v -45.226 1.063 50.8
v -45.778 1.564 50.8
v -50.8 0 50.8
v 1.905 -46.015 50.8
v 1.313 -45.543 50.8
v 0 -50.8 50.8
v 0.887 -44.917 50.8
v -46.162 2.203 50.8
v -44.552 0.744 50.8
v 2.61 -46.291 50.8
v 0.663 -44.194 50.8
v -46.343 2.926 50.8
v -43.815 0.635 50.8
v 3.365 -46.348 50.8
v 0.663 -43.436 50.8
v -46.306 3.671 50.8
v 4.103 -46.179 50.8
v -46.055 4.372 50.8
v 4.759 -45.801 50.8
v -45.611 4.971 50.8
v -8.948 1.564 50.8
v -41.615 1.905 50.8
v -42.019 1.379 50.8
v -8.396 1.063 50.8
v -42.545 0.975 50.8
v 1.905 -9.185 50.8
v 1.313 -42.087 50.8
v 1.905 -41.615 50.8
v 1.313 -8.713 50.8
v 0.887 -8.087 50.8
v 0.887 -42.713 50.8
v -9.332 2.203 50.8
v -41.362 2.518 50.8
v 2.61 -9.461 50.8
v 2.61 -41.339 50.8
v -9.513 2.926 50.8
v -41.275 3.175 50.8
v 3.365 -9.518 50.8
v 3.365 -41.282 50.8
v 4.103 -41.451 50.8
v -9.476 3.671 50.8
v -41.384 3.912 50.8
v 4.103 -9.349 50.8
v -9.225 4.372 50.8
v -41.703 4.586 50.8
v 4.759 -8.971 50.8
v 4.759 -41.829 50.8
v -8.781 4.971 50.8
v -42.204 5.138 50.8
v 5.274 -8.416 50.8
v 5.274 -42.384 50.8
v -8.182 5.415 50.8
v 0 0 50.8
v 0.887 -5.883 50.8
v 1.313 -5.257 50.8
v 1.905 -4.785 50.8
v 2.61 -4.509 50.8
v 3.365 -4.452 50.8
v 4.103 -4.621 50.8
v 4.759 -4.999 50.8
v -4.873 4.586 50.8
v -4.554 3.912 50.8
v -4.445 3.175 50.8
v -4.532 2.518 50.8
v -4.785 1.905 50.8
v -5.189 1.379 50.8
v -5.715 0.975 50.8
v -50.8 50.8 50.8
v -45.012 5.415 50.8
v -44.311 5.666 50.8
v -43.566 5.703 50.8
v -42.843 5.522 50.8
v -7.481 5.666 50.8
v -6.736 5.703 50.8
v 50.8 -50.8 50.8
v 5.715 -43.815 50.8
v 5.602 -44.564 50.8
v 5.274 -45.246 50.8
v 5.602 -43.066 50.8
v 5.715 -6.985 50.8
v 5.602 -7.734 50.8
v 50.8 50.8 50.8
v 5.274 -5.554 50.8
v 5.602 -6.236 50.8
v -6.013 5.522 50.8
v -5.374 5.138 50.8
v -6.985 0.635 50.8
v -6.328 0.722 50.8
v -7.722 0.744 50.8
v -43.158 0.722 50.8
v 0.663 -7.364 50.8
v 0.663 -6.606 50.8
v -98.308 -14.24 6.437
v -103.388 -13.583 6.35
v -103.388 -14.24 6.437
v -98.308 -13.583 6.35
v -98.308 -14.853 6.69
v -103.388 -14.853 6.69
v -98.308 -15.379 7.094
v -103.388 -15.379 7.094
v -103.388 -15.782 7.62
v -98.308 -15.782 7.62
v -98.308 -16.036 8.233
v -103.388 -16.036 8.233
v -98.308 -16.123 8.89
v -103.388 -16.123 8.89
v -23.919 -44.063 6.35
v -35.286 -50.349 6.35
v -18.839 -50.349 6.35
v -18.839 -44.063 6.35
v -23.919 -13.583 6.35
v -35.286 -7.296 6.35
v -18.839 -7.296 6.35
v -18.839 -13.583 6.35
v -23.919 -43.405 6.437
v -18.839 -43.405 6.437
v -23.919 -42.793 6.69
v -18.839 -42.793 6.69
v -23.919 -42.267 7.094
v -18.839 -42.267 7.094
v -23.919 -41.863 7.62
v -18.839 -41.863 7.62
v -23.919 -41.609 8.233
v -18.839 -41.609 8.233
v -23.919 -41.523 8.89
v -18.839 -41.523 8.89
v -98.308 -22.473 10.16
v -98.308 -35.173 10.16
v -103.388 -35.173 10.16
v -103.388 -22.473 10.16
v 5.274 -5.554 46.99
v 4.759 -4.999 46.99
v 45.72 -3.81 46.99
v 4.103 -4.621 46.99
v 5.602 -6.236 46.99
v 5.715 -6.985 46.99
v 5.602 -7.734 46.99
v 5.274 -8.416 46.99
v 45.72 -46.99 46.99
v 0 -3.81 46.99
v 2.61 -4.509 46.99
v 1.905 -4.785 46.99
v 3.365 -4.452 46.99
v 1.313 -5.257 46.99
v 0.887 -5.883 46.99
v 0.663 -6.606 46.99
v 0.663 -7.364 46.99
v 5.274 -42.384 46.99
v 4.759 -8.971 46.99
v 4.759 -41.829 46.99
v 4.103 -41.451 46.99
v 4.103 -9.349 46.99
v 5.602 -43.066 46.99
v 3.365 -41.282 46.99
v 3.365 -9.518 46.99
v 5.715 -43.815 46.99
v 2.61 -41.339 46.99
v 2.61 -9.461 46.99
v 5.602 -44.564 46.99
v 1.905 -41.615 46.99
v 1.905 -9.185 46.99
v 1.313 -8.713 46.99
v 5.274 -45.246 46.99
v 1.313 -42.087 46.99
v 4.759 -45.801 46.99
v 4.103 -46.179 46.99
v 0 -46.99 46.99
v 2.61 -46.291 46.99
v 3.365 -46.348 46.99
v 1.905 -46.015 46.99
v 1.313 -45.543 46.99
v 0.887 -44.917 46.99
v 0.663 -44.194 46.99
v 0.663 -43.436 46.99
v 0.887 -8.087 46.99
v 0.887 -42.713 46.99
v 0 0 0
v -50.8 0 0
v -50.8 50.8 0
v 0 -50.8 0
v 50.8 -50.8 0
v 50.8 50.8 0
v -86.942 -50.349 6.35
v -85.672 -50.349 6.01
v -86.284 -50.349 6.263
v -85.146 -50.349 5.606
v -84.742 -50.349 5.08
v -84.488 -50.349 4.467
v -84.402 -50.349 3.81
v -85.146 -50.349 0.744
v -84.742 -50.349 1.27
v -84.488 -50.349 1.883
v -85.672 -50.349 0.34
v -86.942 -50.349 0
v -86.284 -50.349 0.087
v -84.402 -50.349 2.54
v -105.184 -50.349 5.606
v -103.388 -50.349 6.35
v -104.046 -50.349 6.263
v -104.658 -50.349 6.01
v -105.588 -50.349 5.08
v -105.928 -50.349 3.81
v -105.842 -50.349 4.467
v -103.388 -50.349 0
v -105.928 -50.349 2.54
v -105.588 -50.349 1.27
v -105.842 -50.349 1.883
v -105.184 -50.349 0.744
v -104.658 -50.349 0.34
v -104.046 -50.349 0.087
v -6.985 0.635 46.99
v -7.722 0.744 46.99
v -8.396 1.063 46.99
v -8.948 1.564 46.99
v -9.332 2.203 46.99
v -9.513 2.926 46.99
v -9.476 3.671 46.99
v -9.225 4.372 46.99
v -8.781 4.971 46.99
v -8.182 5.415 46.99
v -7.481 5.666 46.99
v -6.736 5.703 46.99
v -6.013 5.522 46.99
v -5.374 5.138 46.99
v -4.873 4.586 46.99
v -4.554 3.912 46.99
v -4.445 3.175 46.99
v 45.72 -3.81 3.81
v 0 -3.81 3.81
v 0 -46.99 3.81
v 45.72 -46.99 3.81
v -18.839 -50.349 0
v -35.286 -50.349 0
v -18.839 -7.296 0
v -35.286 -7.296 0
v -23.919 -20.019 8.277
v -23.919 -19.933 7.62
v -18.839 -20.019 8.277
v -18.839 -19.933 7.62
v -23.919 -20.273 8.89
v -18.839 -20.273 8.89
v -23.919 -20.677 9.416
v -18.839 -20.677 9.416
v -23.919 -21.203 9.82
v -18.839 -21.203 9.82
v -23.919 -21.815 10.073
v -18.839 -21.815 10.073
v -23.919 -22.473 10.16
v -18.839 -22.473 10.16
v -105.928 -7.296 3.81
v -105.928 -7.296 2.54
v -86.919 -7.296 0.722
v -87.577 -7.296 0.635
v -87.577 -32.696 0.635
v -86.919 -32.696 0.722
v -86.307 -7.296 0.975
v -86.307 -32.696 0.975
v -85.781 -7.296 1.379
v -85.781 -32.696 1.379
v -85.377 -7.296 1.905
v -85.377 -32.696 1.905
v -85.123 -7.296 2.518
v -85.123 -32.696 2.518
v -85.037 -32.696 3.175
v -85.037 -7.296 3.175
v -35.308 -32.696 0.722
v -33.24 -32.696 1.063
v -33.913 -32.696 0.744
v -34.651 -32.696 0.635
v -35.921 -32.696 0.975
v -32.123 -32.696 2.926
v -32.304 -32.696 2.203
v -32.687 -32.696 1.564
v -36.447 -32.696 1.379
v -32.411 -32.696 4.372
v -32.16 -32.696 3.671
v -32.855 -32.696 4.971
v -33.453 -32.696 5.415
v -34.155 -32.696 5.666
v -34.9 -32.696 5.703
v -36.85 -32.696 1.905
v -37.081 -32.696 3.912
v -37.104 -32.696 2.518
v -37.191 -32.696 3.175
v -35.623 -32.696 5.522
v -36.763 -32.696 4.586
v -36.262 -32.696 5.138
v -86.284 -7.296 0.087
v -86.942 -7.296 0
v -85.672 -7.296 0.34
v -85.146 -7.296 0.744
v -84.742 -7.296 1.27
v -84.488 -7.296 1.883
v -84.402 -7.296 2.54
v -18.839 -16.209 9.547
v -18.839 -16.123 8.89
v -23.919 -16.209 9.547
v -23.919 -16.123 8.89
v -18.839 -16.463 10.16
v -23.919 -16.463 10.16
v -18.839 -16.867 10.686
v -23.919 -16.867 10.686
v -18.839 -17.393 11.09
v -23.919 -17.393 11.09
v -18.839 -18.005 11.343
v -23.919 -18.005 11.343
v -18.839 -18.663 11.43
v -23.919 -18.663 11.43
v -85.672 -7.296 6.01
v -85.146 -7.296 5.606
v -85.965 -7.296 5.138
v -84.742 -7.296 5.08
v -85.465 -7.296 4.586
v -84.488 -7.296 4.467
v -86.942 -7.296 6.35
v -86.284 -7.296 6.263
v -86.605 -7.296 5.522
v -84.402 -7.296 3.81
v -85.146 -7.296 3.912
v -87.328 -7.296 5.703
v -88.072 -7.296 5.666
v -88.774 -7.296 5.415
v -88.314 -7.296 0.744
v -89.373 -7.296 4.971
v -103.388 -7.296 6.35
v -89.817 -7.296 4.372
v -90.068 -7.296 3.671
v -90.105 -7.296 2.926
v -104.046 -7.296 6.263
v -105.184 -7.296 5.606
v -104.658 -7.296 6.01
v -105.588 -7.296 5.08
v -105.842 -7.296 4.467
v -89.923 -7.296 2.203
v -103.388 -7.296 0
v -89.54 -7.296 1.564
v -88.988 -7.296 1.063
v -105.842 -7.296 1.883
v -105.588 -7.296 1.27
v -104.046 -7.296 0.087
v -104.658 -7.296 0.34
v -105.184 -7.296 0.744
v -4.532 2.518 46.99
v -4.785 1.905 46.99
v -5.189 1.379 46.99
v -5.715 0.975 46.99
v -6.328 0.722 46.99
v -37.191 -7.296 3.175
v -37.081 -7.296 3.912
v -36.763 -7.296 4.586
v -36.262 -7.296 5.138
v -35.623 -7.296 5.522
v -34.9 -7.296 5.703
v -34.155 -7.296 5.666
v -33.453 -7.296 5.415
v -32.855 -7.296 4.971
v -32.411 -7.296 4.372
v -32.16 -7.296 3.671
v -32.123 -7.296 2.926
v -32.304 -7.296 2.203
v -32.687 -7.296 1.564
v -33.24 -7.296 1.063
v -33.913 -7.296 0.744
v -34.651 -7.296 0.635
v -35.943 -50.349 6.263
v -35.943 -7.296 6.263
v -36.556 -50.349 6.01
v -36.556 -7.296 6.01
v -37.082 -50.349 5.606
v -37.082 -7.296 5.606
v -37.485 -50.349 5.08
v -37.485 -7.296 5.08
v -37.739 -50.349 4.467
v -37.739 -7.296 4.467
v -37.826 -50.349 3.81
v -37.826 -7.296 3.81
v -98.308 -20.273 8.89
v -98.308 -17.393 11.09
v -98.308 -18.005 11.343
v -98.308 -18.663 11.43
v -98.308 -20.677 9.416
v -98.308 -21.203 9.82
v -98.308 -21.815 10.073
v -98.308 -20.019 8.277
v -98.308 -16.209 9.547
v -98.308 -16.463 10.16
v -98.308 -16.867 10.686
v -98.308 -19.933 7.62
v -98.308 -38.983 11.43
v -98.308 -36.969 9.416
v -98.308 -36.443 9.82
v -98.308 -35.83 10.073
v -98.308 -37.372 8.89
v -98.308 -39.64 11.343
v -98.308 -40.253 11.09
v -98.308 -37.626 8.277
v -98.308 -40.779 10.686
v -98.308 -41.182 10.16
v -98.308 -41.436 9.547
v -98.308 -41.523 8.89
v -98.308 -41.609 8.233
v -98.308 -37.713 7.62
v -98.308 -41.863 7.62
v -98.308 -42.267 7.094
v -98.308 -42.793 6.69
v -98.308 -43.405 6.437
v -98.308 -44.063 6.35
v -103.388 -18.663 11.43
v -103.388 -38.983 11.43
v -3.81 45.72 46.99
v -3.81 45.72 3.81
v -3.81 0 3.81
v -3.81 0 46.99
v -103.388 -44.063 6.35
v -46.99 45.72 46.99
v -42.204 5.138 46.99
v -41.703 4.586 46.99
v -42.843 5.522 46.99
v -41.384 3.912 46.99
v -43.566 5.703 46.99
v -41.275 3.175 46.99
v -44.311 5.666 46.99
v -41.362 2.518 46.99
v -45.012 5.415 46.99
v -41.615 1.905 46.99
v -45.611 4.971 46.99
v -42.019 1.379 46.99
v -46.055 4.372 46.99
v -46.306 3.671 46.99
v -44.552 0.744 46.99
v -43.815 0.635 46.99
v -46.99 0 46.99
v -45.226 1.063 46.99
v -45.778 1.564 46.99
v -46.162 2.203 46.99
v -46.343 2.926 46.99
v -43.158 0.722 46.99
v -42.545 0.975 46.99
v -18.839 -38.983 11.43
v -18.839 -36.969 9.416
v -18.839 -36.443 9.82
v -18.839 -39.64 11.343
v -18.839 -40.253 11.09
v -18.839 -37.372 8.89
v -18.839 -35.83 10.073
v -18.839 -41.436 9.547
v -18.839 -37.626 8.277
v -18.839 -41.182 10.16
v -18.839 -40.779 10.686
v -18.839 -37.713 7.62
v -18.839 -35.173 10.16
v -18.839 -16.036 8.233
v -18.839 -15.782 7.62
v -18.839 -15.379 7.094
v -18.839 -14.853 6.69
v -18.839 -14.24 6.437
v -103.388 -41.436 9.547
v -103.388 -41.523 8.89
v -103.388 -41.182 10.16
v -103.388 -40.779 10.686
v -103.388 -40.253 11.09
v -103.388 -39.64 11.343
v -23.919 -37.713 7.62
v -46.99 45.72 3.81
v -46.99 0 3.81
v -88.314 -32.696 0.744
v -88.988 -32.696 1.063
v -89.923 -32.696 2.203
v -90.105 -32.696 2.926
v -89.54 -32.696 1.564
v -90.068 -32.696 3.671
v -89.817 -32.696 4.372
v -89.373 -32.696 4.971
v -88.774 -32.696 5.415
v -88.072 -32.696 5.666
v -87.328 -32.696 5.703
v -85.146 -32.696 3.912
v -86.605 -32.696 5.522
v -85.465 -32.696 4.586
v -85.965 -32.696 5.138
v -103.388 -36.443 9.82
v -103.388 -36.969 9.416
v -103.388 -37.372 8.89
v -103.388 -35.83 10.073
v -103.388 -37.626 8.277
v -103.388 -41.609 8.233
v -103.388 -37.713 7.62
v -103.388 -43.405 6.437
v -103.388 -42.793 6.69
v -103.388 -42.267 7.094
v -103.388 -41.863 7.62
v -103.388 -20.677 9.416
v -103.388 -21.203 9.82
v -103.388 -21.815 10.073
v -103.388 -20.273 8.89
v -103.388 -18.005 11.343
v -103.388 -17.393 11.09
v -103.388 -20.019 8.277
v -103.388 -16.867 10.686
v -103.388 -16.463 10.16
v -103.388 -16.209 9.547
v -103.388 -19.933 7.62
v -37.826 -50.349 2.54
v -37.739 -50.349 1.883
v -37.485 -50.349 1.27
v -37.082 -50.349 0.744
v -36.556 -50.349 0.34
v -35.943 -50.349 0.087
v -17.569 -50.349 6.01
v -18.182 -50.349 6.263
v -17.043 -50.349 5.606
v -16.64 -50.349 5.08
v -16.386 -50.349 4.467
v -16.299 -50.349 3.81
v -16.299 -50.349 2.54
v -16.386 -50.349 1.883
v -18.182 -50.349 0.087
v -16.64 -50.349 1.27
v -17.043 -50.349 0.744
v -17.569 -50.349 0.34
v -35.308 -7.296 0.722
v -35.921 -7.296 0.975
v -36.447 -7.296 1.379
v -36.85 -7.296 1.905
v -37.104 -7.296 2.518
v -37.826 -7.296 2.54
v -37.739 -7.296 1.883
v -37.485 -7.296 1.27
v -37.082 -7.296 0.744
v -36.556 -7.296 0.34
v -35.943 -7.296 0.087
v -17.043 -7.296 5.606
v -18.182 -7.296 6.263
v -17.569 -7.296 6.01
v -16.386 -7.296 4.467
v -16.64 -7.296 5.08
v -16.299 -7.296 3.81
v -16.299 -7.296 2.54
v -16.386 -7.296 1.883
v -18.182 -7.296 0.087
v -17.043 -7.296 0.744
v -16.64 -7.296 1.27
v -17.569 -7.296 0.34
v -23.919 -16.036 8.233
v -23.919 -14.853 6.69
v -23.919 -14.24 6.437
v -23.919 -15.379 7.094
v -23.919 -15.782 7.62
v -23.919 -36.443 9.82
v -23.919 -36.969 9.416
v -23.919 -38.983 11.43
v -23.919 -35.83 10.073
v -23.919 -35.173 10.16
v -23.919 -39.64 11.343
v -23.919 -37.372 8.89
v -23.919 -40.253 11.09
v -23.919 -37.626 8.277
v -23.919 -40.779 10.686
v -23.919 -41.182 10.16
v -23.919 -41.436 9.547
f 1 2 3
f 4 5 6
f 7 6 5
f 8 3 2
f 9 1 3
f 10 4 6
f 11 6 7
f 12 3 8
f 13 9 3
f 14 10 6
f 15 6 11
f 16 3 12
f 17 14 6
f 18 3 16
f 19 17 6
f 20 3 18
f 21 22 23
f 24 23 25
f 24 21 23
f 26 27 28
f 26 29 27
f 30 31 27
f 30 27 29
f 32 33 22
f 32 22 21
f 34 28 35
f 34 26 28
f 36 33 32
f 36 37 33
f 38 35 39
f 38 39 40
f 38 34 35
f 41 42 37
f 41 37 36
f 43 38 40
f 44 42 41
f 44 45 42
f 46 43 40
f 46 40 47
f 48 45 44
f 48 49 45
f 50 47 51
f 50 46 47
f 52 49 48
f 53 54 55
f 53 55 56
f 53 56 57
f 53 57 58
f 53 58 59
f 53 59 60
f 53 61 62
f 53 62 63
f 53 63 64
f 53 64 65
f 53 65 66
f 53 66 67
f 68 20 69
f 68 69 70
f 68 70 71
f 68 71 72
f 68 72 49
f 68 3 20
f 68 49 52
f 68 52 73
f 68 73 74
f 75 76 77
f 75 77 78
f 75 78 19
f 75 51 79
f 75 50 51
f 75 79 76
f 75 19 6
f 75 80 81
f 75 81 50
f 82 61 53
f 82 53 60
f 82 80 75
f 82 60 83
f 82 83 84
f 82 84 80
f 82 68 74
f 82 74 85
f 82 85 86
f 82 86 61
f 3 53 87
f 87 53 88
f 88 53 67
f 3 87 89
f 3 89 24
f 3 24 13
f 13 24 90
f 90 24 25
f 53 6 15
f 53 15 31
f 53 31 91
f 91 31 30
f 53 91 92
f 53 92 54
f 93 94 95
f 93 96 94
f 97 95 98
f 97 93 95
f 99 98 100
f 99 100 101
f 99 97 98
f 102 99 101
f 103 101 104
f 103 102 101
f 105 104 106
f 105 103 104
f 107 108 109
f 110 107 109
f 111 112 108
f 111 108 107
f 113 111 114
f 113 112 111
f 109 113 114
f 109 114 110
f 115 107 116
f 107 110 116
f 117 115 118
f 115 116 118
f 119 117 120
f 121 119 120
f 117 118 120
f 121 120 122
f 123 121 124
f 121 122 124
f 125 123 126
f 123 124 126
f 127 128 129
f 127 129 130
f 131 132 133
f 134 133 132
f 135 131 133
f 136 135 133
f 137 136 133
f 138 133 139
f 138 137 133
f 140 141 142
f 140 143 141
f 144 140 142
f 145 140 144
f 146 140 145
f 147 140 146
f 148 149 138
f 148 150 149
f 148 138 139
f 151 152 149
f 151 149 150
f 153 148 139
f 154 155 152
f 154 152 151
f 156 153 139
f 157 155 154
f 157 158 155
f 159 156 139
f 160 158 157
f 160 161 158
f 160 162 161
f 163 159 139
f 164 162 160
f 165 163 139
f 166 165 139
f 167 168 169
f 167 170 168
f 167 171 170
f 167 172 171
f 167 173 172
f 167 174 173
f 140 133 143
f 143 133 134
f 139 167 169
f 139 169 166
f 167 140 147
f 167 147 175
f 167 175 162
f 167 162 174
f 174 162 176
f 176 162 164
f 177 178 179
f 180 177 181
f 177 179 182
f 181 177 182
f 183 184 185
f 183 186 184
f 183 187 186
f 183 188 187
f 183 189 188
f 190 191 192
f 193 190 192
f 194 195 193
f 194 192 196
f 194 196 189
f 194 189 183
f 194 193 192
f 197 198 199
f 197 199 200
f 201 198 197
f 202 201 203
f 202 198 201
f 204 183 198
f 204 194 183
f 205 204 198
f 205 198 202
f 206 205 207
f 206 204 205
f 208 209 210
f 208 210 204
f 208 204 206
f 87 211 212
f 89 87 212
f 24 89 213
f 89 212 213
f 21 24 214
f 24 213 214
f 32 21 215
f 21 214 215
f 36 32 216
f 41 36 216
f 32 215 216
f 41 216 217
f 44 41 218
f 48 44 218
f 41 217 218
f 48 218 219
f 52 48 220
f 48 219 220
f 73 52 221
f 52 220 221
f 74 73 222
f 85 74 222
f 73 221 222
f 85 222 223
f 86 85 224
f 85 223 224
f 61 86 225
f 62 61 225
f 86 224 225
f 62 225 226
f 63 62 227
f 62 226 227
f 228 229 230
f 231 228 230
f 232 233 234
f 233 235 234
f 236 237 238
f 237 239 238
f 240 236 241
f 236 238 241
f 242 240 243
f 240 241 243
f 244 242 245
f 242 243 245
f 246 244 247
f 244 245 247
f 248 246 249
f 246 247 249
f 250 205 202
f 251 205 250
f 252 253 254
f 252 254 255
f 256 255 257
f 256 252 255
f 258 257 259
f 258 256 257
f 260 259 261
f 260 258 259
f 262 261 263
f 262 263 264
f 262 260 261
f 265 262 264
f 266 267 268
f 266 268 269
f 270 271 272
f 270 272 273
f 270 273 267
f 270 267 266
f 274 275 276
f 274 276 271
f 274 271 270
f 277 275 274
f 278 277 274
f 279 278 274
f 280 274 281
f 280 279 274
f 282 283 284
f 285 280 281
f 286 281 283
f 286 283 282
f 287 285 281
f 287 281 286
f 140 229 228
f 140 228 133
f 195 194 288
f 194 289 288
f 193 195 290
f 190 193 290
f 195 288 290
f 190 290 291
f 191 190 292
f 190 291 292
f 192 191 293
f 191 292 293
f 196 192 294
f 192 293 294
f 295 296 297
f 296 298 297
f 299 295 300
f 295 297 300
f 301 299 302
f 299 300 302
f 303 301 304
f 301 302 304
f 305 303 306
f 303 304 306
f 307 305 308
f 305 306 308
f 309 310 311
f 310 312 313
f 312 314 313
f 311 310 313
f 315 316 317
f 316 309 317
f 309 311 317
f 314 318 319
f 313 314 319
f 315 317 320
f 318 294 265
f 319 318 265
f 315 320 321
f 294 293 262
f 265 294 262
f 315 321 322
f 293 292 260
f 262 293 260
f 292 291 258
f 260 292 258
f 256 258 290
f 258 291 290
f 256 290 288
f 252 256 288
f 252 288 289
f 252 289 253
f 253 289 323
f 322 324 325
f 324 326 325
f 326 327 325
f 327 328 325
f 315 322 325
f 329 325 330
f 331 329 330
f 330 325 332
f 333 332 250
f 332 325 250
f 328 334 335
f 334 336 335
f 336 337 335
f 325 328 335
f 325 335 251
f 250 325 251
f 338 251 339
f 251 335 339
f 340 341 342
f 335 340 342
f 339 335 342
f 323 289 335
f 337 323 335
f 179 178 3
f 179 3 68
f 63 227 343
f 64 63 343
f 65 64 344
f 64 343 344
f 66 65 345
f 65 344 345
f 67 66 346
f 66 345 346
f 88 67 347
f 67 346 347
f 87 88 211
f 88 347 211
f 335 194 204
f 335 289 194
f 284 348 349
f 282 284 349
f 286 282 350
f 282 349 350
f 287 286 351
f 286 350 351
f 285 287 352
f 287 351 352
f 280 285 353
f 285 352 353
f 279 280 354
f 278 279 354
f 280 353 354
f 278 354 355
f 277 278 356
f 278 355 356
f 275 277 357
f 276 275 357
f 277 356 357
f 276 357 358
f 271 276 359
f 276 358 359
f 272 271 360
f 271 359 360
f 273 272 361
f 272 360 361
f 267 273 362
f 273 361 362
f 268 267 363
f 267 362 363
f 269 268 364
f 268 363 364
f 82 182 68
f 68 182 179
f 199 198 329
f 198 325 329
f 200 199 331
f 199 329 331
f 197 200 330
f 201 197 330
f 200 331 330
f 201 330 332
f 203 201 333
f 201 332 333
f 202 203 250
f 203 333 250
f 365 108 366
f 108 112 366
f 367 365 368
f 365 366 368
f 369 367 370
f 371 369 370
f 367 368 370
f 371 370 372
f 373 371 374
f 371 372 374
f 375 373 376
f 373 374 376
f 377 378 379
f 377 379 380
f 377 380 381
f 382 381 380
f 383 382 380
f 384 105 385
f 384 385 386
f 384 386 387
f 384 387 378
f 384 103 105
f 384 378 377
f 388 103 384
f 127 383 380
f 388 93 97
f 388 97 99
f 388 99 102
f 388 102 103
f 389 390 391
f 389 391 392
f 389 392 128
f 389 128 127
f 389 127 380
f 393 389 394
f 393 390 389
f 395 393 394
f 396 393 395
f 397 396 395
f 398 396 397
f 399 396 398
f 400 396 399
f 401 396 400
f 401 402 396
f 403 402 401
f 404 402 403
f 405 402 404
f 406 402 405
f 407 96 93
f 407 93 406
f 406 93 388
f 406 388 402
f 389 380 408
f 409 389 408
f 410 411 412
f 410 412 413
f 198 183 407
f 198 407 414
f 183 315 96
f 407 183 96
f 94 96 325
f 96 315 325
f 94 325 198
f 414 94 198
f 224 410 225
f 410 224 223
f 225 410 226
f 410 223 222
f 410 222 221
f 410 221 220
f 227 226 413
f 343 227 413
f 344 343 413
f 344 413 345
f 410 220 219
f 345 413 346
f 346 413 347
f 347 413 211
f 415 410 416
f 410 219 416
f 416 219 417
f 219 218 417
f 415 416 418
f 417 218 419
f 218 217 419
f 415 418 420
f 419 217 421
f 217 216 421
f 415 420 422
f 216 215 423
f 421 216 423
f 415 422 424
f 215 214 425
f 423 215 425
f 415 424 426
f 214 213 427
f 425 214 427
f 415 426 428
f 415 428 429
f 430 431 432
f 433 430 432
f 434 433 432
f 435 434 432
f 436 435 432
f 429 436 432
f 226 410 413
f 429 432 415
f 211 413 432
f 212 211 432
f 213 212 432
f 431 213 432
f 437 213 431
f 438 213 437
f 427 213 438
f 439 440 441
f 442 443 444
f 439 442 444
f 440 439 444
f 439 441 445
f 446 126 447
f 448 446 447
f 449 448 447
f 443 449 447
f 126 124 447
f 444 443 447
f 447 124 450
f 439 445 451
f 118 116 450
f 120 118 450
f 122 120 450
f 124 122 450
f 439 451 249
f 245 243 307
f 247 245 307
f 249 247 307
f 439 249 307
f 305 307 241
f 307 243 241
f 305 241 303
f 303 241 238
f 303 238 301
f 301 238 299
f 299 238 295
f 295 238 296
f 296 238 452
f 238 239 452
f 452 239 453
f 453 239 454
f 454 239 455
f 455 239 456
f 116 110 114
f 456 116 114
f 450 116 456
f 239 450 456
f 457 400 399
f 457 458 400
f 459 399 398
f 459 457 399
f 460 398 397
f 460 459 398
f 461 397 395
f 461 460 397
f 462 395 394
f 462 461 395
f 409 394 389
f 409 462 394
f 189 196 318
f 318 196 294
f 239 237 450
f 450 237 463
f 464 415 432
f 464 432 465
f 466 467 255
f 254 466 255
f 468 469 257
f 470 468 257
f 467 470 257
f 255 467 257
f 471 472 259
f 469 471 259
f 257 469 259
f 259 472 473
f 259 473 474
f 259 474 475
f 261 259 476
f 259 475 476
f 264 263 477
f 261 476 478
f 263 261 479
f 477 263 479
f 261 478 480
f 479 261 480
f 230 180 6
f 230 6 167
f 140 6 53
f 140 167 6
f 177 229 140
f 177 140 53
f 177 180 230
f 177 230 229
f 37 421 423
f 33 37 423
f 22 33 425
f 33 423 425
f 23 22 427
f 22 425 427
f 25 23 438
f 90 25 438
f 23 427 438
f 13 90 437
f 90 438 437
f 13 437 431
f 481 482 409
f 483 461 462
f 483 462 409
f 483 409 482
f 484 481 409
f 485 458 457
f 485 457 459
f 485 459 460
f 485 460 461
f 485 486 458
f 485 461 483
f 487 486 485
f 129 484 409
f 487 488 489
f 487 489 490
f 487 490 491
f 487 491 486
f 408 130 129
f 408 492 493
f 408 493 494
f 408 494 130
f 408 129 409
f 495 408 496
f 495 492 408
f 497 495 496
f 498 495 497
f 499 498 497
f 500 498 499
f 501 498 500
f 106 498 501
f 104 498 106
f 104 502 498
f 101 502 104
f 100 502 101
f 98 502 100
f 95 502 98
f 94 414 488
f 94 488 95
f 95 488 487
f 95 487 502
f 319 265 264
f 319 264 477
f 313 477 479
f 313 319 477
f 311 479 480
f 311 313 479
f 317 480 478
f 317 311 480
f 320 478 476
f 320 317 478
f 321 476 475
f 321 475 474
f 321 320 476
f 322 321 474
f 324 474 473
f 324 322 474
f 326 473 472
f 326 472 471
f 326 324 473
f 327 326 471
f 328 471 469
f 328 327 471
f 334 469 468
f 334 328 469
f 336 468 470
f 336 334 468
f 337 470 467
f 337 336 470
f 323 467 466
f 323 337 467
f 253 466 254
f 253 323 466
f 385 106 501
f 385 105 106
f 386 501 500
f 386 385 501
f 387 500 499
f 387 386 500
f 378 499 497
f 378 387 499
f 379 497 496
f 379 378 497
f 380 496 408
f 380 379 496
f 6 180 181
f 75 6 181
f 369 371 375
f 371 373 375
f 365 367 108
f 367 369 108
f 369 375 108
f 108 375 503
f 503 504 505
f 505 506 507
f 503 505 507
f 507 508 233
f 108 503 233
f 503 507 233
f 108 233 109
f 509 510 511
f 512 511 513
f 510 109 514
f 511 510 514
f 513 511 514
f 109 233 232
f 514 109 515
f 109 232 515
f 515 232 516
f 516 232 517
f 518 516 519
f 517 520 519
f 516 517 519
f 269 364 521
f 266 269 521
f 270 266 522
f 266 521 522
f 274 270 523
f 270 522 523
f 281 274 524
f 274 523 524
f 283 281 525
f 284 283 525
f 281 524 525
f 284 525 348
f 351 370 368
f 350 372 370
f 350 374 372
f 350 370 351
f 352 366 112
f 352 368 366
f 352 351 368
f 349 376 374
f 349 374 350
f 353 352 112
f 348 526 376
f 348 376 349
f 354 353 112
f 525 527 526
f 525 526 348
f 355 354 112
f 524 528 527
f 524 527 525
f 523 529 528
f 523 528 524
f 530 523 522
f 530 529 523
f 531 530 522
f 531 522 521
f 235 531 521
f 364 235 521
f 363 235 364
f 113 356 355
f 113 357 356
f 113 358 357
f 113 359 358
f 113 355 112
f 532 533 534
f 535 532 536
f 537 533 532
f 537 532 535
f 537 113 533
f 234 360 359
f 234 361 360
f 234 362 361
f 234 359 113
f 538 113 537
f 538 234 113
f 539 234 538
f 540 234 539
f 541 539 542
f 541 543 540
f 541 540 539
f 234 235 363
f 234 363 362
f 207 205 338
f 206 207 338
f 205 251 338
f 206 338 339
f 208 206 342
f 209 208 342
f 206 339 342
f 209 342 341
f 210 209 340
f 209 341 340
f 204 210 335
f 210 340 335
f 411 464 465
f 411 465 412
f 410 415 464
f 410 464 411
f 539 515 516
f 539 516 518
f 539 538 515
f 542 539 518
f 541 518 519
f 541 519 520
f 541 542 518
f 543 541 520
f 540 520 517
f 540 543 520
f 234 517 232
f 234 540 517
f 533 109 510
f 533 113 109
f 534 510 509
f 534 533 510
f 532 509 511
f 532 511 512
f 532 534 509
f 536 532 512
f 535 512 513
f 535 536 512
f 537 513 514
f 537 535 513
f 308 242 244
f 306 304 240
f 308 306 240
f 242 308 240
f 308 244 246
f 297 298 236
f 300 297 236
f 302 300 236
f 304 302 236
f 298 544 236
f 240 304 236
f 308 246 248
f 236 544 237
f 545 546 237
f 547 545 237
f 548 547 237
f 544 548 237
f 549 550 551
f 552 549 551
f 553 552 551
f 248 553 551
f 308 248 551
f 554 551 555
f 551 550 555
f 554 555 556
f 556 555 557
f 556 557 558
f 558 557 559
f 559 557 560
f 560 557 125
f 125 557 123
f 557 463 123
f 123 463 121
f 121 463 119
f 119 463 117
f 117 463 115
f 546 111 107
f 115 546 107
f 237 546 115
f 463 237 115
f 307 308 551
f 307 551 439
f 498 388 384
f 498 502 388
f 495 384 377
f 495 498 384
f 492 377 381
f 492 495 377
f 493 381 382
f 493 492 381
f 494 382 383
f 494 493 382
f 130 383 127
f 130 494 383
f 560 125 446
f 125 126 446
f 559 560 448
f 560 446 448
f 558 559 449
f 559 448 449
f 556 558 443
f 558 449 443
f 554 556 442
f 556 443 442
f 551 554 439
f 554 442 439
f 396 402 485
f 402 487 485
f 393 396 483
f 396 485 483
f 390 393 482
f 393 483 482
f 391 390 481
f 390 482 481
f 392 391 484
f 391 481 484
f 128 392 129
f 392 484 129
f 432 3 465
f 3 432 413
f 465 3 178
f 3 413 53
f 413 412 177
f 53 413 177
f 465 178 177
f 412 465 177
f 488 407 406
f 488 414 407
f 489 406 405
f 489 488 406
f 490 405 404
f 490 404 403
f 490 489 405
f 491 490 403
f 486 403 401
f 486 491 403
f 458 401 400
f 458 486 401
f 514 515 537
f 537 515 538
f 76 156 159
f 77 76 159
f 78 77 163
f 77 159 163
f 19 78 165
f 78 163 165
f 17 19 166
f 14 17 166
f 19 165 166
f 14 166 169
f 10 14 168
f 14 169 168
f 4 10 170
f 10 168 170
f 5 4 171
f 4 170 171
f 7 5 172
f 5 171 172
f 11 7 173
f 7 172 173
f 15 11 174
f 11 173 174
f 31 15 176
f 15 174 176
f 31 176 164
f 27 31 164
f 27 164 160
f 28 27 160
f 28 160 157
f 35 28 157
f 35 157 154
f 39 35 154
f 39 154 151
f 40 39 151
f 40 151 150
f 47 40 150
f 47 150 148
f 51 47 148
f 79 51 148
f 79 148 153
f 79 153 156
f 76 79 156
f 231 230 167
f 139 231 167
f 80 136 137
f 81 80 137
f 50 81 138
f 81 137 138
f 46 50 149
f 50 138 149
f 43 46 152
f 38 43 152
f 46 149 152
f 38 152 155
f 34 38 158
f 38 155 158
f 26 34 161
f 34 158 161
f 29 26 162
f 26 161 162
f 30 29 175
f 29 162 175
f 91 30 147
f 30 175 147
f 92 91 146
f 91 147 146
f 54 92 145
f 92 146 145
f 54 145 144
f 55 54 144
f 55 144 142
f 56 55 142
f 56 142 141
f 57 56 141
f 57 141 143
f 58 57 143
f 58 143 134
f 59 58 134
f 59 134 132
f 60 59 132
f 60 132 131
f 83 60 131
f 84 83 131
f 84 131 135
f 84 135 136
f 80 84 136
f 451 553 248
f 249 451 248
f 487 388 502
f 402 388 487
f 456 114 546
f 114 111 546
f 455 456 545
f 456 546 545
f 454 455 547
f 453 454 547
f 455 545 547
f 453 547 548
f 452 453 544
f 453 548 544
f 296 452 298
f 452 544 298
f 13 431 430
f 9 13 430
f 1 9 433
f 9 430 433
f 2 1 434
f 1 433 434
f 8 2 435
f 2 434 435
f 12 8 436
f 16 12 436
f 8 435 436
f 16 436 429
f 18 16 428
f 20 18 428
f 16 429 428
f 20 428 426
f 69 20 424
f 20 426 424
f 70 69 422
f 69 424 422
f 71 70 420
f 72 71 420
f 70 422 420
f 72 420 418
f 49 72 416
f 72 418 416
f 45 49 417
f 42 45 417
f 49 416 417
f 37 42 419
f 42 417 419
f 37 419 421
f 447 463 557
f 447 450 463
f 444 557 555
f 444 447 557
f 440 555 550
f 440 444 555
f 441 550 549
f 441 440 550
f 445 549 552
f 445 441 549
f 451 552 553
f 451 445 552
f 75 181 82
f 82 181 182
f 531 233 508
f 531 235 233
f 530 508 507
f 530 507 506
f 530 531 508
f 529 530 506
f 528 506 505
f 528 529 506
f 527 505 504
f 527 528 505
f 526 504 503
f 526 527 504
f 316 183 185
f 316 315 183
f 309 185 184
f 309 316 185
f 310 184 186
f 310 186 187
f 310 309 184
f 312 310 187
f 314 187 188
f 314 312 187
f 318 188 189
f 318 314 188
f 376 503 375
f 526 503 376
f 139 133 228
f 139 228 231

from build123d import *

# Parameters (mm, degrees)
F0_W      = 50.8
F0_H      = 50.8
F1_DEPTH  = 50.8
F4_DEPTH  = 45.72
F6_DEPTH  = 25.4
F2_W      = 43.18
F2_H      = 43.18
F7_DEPTH  = 45.72
F8_R      = 2.54
F9_DEPTH  = 25.4
F10_W     = 21.5265
F10_H     = 43.053
F11_DEPTH = 6.35
F13_DEPTH = 25.4
F15_DEPTH = 5.08
F17_DEPTH = 25.4
F18_R     = 2.53999
F19_W     = 5.3519308567
F19_H     = 34.44376681
F20_DEPTH = 25.4
F22_DEPTH = 25.4
F23_R     = 2.54
F23_2_R   = 2.54
F24_R     = 2.53999
F24_2_R   = 2.53999


# Not quite as in the source:
# - a fillet or chamfer is up to 0.001 mm smaller than in the source, because OpenCascade refuses the exact size


with BuildPart() as f1:
    # F0 (on Top) → F1 (new body)
    with BuildSketch(Plane.XY):
        with Locations((25.4, 25.4)):
            Rectangle(F0_W, F0_H)
        with Locations((-25.4, 25.4)):
            Rectangle(F0_W, F0_H)
        with Locations((25.4, -25.4)):
            Rectangle(F0_W, F0_H)
    extrude(amount=F1_DEPTH)

    # F3 (on face) → F4 (cut)
    with BuildSketch(Plane.XZ):
        Polygon((-3.81, 46.99), (-46.99, 46.99), (-3.81, 3.81), align=None)
        Polygon((-3.81, 3.81), (-46.99, 46.99), (-46.99, 3.81), align=None)
    extrude(amount=-F4_DEPTH, mode=Mode.SUBTRACT)

    # F5 (on face) → F6 (cut)
    with BuildSketch(Plane(origin=(0, 0, 46.99), x_dir=(1, 0, 0), z_dir=(0, 0, -1))):
        with BuildLine():
            ThreePointArc((-41.275, -3.175), (-42.0189487758, -1.3789487758), (-43.815, -0.635))
            ThreePointArc((-43.815, -0.635), (-45.6110512242, -4.9710512242), (-41.275, -3.175))
        make_face()
        with BuildLine():
            ThreePointArc((-4.445, -3.175), (-5.1889487758, -1.3789487758), (-6.985, -0.635))
            ThreePointArc((-6.985, -0.635), (-8.7810512242, -4.9710512242), (-4.445, -3.175))
        make_face()
    extrude(amount=-F6_DEPTH, mode=Mode.SUBTRACT)

    # F2 (on face) → F7 (cut)
    with BuildSketch(Plane(origin=(0, 0, 0), x_dir=(0, -1, 0), z_dir=(-1, 0, 0))):
        with Locations((25.4, 25.4)):
            Rectangle(F2_W, F2_H)
    extrude(amount=-F7_DEPTH, mode=Mode.SUBTRACT)

    # F8 (on face) → F9 (cut)
    with BuildSketch(Plane(origin=(0, 0, 46.99), x_dir=(1, 0, 0), z_dir=(0, 0, -1))):
        with BuildLine():
            ThreePointArc((0.635, 6.985), (3.175, 4.445), (5.715, 6.985))
            ThreePointArc((5.715, 6.985), (3.175, 9.525), (0.635, 6.985))
        make_face()
        with Locations((3.175, 43.815)):
            Circle(F8_R)
    extrude(amount=-F9_DEPTH, mode=Mode.SUBTRACT)


with BuildPart() as f11:
    # F10 (on Top) → F11 (new body)
    with BuildSketch(Plane.XY):
        with Locations((-27.0625350275, -28.8227358833)):
            Rectangle(F10_W, F10_H)
    extrude(amount=F11_DEPTH)

    # F12 (on face) → F13 (cut)
    with BuildSketch(Plane(origin=(0, -7.2962358833, 0), x_dir=(-1, 0, 0), z_dir=(0, 1, 0))):
        with BuildLine():
            ThreePointArc((34.6507850275, 0.635), (36.4468362517, 1.3789487758), (37.1907850275, 3.175))
            ThreePointArc((37.1907850275, 3.175), (32.8547338033, 4.9710512242), (34.6507850275, 0.635))
        make_face()
    extrude(amount=-F13_DEPTH, mode=Mode.SUBTRACT)

    # F14 (on face) → F15 (join)
    with BuildSketch(Plane.XY.offset(6.35)):
        Polygon((-18.8392850275, -28.8227358833), (-18.8392850275, -16.1227358833), (-23.9192850275, -16.1227358833), (-23.9192850275, -41.5227358833), (-18.8392850275, -41.5227358833), align=None)
    extrude(amount=F15_DEPTH)

    # F16 (on face) → F17 (cut)
    with BuildSketch(Plane(origin=(-23.9192850275, 0, 0), x_dir=(0, -1, 0), z_dir=(-1, 0, 0))):
        Polygon((37.7127358833, 10.16), (22.4727358833, 10.16), (35.1727358833, 7.62), (37.7127358833, 7.62), align=None)
        Polygon((35.1727358833, 7.62), (22.4727358833, 10.16), (19.9327358833, 10.16), (19.9327358833, 7.62), align=None)
    extrude(amount=-F17_DEPTH, mode=Mode.SUBTRACT)

    # F18 (radius 2.54 in the source; OpenCascade refuses exactly that, so slightly less here)
    f18_edges = [f11.edges().sort_by_distance(p)[0] for p in [
        (-21.379285, -41.522736, 6.35),
        (-21.379285, -41.522736, 11.43),
        (-21.379285, -16.122736, 11.43),
        (-21.379285, -16.122736, 6.35),
        (-21.379285, -19.932736, 10.16),
        (-21.379285, -37.712736, 10.16),
    ]]
    fillet(f18_edges, radius=F18_R)


with BuildPart() as f20:
    # F19 (on Top) → F20 (new body)
    with BuildSketch(Plane.XY):
        with Locations((-63.7897327542, -23.4408969991)):
            Rectangle(F19_W, F19_H)
    extrude(amount=F20_DEPTH)

    # F22 (cut): a face of the model
    f22_faces = [f20.faces().sort_by_distance(p)[0] for p in [
        (-63.7897327542, -23.4408969991, 25.4),
    ]]
    extrude(f22_faces, amount=-F22_DEPTH, mode=Mode.SUBTRACT)


with BuildPart() as f21_1:
    # F21: instance of F11
    add(f11.part.mirror(Plane(origin=(-61.1137673259, -23.4408969991, 12.7), x_dir=(0, 1, 0), z_dir=(1, 0, 0))))

    # F23
    f23_edges = [f21_1.edges().sort_by_distance(p)[0] for p in [
        (-84.40175, -28.822736, 6.35),
        (-84.40175, -28.822736, 0),
    ]]
    fillet(f23_edges, radius=F23_R)

    # F24#2 (radius 2.54 in the source; OpenCascade refuses exactly that, so slightly less here)
    f24_2_edges = [f21_1.edges().sort_by_distance(p)[0] for p in [
        (-105.92825, -28.822736, 6.35),
        (-105.92825, -28.822736, 0),
    ]]
    fillet(f24_2_edges, radius=F24_2_R)


with BuildPart() as f11_1:
    add(f11.part)

    # F23#2
    f23_2_edges = [f11_1.edges().sort_by_distance(p)[0] for p in [
        (-37.825785, -28.822736, 0),
        (-37.825785, -28.822736, 6.35),
    ]]
    fillet(f23_2_edges, radius=F23_2_R)

    # F24 (radius 2.54 in the source; OpenCascade refuses exactly that, so slightly less here)
    f24_edges = [f11_1.edges().sort_by_distance(p)[0] for p in [
        (-16.299285, -28.822736, 0),
        (-16.299285, -28.822736, 6.35),
    ]]
    fillet(f24_edges, radius=F24_R)


solid = Compound([f1.part, f21_1.part, f11_1.part])
